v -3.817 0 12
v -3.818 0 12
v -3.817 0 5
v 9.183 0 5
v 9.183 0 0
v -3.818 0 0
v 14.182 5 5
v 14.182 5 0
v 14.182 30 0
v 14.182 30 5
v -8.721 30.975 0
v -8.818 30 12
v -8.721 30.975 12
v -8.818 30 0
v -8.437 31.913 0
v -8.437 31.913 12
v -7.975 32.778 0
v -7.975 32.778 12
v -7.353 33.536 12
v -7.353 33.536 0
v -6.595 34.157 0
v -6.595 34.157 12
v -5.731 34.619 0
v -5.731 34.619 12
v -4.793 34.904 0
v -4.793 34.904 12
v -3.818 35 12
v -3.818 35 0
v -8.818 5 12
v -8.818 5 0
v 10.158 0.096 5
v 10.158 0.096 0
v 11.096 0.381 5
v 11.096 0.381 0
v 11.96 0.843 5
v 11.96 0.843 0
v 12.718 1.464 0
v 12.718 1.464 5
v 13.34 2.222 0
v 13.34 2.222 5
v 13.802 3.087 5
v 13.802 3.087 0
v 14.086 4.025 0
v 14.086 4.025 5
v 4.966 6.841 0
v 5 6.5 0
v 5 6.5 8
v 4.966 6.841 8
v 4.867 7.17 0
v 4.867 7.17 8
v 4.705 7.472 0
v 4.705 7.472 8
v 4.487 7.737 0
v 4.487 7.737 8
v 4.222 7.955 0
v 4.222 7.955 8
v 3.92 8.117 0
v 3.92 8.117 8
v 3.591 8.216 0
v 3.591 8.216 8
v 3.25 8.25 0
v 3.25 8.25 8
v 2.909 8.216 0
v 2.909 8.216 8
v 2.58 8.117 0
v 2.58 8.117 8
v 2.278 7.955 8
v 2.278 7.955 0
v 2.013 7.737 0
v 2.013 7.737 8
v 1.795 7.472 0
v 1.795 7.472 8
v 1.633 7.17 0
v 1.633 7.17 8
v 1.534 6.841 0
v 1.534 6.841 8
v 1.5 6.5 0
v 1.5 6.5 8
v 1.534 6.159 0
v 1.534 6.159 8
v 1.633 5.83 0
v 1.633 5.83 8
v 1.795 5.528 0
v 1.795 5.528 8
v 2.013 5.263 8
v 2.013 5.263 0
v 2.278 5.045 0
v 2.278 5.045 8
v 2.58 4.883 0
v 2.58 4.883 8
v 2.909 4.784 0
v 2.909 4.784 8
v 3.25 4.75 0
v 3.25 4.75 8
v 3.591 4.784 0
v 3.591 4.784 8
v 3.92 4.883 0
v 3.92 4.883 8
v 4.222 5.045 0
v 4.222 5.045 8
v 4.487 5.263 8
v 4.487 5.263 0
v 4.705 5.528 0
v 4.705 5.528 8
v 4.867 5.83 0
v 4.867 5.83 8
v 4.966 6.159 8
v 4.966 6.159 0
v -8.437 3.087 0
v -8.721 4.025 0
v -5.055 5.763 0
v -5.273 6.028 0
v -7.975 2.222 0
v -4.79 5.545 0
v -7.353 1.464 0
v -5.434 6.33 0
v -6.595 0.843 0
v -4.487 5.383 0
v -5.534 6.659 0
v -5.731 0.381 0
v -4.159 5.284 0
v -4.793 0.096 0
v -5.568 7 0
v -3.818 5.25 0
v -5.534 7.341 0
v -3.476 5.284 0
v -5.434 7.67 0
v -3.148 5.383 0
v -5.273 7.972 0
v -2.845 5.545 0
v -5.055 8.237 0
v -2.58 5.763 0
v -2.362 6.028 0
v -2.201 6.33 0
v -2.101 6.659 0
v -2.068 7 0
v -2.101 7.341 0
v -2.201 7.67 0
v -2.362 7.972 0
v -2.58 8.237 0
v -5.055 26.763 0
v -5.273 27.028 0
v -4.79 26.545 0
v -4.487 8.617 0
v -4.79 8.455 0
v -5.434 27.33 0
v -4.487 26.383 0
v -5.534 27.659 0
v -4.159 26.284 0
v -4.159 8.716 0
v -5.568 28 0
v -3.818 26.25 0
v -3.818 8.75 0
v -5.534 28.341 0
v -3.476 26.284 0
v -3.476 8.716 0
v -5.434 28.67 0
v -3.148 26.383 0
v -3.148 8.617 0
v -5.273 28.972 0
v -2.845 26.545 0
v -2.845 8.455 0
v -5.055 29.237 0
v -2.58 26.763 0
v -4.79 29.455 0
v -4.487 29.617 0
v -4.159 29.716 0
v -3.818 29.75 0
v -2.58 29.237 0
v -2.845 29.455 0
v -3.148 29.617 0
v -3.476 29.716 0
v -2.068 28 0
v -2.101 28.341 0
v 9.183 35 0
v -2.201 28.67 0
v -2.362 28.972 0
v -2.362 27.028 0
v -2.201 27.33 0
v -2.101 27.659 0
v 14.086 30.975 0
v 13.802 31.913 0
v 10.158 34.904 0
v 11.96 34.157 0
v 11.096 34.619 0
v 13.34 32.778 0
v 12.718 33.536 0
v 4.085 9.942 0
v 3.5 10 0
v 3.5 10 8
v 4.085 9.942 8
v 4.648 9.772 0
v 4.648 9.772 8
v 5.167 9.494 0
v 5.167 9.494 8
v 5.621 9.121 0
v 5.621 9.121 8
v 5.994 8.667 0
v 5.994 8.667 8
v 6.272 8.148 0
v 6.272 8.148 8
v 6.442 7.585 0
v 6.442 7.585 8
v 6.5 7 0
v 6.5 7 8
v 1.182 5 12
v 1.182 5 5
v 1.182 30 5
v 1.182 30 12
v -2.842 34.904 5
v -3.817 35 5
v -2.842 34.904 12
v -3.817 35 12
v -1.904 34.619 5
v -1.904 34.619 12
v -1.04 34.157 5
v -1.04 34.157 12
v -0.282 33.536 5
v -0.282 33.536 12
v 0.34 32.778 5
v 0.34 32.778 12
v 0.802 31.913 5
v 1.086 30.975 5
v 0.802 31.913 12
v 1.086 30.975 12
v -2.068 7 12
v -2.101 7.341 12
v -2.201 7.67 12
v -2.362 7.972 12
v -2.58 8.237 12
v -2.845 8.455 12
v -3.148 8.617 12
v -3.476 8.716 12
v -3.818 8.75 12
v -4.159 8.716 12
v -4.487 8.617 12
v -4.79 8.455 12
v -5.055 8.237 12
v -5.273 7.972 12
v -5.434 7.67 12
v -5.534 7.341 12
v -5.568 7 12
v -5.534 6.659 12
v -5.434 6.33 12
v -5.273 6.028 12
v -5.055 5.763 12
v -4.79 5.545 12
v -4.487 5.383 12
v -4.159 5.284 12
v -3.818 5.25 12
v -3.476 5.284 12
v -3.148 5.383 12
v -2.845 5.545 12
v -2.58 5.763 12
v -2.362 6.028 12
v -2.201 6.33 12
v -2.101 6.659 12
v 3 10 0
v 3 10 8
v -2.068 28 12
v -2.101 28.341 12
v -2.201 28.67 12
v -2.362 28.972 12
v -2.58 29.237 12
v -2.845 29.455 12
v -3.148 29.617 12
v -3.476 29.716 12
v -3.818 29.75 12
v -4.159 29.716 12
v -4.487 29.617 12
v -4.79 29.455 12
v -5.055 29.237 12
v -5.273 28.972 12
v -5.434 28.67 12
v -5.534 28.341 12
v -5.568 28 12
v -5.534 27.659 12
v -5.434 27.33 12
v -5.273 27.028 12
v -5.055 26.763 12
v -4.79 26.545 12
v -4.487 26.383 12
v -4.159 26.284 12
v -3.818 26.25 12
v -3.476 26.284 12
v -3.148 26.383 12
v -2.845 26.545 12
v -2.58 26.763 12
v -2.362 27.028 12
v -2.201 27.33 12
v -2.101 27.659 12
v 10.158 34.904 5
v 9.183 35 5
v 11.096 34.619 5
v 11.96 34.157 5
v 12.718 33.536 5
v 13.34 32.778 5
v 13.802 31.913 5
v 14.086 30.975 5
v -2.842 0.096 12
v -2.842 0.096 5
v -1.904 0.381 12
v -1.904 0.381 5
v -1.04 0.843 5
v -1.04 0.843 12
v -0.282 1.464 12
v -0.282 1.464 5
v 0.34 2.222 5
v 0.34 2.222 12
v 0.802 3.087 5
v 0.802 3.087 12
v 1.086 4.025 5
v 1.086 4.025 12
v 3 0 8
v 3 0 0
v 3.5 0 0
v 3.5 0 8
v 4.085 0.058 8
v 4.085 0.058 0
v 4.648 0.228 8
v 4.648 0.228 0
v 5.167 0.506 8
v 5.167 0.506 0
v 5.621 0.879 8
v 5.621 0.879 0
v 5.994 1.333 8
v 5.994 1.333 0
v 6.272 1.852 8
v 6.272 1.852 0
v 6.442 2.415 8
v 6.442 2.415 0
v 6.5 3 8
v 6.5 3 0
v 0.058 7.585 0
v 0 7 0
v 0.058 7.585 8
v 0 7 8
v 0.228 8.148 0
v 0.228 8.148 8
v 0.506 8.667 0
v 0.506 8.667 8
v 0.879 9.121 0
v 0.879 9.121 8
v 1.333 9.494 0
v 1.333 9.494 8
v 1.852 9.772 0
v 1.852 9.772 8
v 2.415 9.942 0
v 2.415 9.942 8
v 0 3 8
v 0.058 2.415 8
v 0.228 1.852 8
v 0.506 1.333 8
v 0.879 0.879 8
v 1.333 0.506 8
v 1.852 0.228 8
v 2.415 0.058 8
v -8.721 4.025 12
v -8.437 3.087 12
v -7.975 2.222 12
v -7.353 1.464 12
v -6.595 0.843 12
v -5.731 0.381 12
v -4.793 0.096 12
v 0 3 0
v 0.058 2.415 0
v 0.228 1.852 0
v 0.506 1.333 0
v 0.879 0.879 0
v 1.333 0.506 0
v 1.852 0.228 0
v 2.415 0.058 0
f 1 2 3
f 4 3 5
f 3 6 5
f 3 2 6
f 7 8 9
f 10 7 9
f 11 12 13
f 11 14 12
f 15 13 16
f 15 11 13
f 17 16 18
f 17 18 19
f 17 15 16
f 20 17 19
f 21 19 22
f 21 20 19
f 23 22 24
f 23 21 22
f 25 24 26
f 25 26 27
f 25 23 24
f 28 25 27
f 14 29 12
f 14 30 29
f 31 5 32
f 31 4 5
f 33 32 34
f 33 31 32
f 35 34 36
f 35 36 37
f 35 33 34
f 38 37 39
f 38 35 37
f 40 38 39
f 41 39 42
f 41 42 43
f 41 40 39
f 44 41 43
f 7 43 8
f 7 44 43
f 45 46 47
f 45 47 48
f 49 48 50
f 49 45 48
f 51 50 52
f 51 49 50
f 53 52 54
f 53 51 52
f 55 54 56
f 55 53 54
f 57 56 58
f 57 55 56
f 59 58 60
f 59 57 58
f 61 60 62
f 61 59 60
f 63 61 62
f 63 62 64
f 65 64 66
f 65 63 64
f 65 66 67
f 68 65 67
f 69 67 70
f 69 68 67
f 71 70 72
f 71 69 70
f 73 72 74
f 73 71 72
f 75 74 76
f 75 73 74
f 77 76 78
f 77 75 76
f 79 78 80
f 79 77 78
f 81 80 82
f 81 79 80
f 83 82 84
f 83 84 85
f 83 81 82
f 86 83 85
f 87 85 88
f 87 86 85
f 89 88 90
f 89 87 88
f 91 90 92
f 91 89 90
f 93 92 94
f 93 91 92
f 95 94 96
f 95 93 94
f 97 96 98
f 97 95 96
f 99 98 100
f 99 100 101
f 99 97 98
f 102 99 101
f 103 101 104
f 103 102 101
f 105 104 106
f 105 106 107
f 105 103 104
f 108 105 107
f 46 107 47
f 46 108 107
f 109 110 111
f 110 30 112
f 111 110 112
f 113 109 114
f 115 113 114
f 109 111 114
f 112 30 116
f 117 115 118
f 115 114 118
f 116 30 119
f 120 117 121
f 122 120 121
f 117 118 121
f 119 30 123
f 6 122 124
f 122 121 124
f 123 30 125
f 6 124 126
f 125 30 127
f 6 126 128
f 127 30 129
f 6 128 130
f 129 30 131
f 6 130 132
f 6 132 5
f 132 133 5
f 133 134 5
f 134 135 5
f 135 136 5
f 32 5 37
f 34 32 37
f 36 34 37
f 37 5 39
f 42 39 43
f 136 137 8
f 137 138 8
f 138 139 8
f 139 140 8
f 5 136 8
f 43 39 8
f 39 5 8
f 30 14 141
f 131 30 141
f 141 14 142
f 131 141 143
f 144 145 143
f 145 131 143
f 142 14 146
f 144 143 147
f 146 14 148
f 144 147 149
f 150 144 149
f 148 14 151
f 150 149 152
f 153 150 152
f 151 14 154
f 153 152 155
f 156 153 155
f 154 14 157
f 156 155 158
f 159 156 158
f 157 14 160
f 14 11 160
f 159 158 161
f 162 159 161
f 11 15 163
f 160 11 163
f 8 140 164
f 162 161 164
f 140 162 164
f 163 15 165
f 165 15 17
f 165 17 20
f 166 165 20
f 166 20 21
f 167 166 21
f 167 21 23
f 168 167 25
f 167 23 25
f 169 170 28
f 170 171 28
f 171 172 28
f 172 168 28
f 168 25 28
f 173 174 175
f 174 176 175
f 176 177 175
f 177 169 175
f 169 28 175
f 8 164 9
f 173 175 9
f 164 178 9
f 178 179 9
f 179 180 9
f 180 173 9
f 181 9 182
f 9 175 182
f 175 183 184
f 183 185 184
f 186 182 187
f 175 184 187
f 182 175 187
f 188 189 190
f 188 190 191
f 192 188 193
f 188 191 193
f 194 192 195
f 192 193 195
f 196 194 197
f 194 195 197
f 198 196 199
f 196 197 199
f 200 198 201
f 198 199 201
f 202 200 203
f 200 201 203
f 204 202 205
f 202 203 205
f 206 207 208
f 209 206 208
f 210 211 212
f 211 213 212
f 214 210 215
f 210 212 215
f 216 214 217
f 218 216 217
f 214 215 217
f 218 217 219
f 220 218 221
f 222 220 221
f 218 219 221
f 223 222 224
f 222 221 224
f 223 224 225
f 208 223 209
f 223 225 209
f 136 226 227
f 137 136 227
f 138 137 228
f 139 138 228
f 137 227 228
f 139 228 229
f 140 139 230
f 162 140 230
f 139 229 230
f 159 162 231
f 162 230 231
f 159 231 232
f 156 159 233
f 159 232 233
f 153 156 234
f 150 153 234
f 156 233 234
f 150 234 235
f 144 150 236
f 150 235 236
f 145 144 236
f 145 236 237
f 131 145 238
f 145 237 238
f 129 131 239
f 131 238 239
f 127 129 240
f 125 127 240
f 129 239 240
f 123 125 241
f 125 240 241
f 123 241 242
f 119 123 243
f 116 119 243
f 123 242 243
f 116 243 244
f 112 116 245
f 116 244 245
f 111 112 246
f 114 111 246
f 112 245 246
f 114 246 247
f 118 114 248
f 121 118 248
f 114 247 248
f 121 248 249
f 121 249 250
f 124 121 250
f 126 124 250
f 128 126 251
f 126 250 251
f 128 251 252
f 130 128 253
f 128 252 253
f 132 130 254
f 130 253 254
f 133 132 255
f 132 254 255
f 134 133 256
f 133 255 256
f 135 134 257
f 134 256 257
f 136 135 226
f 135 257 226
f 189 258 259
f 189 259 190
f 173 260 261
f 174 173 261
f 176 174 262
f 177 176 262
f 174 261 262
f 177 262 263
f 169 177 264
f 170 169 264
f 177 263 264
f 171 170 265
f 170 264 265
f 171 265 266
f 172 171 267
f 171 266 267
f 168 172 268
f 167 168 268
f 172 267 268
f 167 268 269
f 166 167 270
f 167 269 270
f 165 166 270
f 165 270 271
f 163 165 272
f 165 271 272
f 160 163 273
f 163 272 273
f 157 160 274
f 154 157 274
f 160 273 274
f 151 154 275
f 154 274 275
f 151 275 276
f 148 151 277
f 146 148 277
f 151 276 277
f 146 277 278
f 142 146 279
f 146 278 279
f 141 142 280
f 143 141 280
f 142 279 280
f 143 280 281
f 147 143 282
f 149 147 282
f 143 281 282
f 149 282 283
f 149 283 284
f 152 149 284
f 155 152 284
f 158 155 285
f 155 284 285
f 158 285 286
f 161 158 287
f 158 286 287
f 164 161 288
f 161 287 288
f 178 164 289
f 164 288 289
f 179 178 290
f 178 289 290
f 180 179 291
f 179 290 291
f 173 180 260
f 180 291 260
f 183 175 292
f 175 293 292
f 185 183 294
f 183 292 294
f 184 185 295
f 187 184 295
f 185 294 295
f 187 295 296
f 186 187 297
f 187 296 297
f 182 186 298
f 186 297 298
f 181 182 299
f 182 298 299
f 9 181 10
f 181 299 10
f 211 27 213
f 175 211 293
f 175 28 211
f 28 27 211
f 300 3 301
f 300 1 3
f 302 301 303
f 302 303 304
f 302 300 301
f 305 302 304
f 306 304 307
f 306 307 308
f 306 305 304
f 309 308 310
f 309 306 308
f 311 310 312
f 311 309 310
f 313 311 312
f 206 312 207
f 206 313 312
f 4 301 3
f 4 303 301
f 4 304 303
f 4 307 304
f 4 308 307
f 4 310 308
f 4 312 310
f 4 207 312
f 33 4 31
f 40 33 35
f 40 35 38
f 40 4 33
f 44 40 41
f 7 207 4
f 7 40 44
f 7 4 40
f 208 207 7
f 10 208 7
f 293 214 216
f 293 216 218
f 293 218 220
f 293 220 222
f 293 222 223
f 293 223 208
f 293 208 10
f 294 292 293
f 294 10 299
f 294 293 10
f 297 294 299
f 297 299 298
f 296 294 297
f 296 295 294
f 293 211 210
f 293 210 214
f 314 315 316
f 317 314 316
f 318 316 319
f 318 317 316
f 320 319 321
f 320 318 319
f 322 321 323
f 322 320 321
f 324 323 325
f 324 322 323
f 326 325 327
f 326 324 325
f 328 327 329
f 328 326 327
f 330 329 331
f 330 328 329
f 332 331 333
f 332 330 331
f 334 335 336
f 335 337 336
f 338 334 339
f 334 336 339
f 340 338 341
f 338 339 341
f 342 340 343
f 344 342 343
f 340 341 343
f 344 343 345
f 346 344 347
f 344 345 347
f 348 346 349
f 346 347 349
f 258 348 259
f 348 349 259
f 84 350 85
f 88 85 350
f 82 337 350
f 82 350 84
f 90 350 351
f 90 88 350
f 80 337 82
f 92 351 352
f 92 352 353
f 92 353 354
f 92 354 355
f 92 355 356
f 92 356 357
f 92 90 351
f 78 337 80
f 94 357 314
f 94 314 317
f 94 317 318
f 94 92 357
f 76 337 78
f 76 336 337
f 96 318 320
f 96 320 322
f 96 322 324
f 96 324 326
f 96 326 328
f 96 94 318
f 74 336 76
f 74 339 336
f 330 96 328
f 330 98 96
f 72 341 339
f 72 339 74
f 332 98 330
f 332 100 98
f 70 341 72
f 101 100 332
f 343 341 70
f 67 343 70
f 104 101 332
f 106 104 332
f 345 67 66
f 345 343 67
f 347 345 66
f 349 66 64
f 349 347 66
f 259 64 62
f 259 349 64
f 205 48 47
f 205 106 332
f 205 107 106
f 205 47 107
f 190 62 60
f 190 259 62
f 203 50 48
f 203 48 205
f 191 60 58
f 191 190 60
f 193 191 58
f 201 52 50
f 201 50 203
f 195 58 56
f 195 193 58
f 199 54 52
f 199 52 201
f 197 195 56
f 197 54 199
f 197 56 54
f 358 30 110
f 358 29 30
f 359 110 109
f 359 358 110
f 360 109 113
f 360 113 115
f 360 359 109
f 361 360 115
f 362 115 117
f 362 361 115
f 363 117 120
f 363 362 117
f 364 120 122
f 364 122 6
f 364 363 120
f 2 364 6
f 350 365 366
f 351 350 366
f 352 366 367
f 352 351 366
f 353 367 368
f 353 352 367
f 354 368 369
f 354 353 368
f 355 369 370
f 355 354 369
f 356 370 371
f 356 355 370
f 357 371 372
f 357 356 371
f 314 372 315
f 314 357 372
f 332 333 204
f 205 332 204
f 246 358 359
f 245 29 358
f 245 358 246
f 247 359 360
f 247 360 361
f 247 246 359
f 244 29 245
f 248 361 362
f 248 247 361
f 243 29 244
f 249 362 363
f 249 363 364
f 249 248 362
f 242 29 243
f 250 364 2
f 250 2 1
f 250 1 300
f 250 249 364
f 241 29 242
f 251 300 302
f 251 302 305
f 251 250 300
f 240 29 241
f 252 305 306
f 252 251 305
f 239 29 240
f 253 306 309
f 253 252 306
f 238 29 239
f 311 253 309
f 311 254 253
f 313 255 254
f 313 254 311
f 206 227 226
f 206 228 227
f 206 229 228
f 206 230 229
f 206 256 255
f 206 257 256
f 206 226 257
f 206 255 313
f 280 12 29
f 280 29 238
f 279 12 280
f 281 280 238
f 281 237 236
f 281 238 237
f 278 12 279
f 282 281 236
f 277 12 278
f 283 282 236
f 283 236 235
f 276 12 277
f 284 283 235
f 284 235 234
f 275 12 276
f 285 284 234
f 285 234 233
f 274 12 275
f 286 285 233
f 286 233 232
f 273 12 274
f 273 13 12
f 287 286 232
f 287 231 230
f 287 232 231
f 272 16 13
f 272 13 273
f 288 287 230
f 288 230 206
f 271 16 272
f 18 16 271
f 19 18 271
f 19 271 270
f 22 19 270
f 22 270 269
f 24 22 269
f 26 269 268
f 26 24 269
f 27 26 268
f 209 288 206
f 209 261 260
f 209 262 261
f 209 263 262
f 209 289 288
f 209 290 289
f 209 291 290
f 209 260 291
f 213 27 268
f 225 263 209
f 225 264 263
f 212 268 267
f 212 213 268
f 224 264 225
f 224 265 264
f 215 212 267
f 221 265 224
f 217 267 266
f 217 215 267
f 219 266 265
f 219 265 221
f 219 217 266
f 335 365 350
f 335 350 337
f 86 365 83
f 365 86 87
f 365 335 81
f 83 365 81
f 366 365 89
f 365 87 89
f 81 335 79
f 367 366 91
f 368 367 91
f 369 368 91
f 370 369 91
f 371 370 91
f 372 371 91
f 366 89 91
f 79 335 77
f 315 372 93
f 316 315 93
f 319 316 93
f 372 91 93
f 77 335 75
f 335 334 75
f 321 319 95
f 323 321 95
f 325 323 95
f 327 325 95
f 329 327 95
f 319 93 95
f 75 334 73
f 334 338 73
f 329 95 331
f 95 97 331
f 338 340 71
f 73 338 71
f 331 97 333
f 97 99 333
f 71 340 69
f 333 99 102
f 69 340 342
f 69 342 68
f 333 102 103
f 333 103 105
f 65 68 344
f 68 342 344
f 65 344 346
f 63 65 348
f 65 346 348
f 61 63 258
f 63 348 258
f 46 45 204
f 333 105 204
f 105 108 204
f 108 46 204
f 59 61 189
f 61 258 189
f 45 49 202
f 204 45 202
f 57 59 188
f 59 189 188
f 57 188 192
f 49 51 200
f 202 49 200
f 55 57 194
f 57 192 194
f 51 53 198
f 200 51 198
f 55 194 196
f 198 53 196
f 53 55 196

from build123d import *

# Parameters (mm, degrees)
F0_W     = 23
F0_H     = 35
F1_DEPTH = 5
F2_W     = 10
F2_H     = 35
F3_DEPTH = 7
F4_R     = 1.75
F5_DEPTH = 12
F6_R     = 4.99999
F7_W     = 6.5
F7_H     = 10
F7_R     = 1.75
F8_DEPTH = 8
F9_R     = 3


# Not quite as in the source:
# - a fillet or chamfer is up to 0.001 mm smaller than in the source, because OpenCascade refuses the exact size


with BuildPart() as f1:
    # F0 (on Top) → F1 (new body)
    with BuildSketch(Plane.XY):
        with Locations((2.6824958399, 17.5)):
            Rectangle(F0_W, F0_H)
    extrude(amount=F1_DEPTH)

    # F2 (on face) → F3 (join)
    with BuildSketch(Plane.XY.offset(5)):
        with Locations((-3.8175041601, 17.5)):
            Rectangle(F2_W, F2_H)
    extrude(amount=F3_DEPTH)

    # F4 (on face) → F5 (cut, through all)
    with BuildSketch(Plane.XY.offset(12)):
        with Locations((-3.8175041601, 28)):
            Circle(F4_R)
        with Locations((-3.8175041601, 7)):
            Circle(F4_R)
    extrude(amount=-F5_DEPTH, mode=Mode.SUBTRACT)

    # F6 (radius 5 in the source; OpenCascade refuses exactly that, so slightly less here)
    f6_edges = [f1.edges().sort_by_distance(p)[0] for p in [
        (-8.817504, 35, 6),
        (1.182496, 35, 8.5),
        (-8.817504, 0, 6),
        (1.182496, 0, 8.5),
        (14.182496, 0, 2.5),
        (14.182496, 35, 2.5),
    ]]
    fillet(f6_edges, radius=F6_R)


with BuildPart() as f8:
    # F7 (on Top) → F8 (new body)
    with BuildSketch(Plane.XY):
        with Locations((3.25, 5)):
            Rectangle(F7_W, F7_H)
        with Locations((3.25, 6.5)):
            Circle(F7_R, mode=Mode.SUBTRACT)
    extrude(amount=F8_DEPTH)

    # F9
    f9_edges = [f8.edges().sort_by_distance(p)[0] for p in [
        (6.5, 0, 4),
        (6.5, 10, 4),
        (0, 0, 4),
        (0, 10, 4),
    ]]
    fillet(f9_edges, radius=F9_R)


solid = Compound([f1.part, f8.part])
